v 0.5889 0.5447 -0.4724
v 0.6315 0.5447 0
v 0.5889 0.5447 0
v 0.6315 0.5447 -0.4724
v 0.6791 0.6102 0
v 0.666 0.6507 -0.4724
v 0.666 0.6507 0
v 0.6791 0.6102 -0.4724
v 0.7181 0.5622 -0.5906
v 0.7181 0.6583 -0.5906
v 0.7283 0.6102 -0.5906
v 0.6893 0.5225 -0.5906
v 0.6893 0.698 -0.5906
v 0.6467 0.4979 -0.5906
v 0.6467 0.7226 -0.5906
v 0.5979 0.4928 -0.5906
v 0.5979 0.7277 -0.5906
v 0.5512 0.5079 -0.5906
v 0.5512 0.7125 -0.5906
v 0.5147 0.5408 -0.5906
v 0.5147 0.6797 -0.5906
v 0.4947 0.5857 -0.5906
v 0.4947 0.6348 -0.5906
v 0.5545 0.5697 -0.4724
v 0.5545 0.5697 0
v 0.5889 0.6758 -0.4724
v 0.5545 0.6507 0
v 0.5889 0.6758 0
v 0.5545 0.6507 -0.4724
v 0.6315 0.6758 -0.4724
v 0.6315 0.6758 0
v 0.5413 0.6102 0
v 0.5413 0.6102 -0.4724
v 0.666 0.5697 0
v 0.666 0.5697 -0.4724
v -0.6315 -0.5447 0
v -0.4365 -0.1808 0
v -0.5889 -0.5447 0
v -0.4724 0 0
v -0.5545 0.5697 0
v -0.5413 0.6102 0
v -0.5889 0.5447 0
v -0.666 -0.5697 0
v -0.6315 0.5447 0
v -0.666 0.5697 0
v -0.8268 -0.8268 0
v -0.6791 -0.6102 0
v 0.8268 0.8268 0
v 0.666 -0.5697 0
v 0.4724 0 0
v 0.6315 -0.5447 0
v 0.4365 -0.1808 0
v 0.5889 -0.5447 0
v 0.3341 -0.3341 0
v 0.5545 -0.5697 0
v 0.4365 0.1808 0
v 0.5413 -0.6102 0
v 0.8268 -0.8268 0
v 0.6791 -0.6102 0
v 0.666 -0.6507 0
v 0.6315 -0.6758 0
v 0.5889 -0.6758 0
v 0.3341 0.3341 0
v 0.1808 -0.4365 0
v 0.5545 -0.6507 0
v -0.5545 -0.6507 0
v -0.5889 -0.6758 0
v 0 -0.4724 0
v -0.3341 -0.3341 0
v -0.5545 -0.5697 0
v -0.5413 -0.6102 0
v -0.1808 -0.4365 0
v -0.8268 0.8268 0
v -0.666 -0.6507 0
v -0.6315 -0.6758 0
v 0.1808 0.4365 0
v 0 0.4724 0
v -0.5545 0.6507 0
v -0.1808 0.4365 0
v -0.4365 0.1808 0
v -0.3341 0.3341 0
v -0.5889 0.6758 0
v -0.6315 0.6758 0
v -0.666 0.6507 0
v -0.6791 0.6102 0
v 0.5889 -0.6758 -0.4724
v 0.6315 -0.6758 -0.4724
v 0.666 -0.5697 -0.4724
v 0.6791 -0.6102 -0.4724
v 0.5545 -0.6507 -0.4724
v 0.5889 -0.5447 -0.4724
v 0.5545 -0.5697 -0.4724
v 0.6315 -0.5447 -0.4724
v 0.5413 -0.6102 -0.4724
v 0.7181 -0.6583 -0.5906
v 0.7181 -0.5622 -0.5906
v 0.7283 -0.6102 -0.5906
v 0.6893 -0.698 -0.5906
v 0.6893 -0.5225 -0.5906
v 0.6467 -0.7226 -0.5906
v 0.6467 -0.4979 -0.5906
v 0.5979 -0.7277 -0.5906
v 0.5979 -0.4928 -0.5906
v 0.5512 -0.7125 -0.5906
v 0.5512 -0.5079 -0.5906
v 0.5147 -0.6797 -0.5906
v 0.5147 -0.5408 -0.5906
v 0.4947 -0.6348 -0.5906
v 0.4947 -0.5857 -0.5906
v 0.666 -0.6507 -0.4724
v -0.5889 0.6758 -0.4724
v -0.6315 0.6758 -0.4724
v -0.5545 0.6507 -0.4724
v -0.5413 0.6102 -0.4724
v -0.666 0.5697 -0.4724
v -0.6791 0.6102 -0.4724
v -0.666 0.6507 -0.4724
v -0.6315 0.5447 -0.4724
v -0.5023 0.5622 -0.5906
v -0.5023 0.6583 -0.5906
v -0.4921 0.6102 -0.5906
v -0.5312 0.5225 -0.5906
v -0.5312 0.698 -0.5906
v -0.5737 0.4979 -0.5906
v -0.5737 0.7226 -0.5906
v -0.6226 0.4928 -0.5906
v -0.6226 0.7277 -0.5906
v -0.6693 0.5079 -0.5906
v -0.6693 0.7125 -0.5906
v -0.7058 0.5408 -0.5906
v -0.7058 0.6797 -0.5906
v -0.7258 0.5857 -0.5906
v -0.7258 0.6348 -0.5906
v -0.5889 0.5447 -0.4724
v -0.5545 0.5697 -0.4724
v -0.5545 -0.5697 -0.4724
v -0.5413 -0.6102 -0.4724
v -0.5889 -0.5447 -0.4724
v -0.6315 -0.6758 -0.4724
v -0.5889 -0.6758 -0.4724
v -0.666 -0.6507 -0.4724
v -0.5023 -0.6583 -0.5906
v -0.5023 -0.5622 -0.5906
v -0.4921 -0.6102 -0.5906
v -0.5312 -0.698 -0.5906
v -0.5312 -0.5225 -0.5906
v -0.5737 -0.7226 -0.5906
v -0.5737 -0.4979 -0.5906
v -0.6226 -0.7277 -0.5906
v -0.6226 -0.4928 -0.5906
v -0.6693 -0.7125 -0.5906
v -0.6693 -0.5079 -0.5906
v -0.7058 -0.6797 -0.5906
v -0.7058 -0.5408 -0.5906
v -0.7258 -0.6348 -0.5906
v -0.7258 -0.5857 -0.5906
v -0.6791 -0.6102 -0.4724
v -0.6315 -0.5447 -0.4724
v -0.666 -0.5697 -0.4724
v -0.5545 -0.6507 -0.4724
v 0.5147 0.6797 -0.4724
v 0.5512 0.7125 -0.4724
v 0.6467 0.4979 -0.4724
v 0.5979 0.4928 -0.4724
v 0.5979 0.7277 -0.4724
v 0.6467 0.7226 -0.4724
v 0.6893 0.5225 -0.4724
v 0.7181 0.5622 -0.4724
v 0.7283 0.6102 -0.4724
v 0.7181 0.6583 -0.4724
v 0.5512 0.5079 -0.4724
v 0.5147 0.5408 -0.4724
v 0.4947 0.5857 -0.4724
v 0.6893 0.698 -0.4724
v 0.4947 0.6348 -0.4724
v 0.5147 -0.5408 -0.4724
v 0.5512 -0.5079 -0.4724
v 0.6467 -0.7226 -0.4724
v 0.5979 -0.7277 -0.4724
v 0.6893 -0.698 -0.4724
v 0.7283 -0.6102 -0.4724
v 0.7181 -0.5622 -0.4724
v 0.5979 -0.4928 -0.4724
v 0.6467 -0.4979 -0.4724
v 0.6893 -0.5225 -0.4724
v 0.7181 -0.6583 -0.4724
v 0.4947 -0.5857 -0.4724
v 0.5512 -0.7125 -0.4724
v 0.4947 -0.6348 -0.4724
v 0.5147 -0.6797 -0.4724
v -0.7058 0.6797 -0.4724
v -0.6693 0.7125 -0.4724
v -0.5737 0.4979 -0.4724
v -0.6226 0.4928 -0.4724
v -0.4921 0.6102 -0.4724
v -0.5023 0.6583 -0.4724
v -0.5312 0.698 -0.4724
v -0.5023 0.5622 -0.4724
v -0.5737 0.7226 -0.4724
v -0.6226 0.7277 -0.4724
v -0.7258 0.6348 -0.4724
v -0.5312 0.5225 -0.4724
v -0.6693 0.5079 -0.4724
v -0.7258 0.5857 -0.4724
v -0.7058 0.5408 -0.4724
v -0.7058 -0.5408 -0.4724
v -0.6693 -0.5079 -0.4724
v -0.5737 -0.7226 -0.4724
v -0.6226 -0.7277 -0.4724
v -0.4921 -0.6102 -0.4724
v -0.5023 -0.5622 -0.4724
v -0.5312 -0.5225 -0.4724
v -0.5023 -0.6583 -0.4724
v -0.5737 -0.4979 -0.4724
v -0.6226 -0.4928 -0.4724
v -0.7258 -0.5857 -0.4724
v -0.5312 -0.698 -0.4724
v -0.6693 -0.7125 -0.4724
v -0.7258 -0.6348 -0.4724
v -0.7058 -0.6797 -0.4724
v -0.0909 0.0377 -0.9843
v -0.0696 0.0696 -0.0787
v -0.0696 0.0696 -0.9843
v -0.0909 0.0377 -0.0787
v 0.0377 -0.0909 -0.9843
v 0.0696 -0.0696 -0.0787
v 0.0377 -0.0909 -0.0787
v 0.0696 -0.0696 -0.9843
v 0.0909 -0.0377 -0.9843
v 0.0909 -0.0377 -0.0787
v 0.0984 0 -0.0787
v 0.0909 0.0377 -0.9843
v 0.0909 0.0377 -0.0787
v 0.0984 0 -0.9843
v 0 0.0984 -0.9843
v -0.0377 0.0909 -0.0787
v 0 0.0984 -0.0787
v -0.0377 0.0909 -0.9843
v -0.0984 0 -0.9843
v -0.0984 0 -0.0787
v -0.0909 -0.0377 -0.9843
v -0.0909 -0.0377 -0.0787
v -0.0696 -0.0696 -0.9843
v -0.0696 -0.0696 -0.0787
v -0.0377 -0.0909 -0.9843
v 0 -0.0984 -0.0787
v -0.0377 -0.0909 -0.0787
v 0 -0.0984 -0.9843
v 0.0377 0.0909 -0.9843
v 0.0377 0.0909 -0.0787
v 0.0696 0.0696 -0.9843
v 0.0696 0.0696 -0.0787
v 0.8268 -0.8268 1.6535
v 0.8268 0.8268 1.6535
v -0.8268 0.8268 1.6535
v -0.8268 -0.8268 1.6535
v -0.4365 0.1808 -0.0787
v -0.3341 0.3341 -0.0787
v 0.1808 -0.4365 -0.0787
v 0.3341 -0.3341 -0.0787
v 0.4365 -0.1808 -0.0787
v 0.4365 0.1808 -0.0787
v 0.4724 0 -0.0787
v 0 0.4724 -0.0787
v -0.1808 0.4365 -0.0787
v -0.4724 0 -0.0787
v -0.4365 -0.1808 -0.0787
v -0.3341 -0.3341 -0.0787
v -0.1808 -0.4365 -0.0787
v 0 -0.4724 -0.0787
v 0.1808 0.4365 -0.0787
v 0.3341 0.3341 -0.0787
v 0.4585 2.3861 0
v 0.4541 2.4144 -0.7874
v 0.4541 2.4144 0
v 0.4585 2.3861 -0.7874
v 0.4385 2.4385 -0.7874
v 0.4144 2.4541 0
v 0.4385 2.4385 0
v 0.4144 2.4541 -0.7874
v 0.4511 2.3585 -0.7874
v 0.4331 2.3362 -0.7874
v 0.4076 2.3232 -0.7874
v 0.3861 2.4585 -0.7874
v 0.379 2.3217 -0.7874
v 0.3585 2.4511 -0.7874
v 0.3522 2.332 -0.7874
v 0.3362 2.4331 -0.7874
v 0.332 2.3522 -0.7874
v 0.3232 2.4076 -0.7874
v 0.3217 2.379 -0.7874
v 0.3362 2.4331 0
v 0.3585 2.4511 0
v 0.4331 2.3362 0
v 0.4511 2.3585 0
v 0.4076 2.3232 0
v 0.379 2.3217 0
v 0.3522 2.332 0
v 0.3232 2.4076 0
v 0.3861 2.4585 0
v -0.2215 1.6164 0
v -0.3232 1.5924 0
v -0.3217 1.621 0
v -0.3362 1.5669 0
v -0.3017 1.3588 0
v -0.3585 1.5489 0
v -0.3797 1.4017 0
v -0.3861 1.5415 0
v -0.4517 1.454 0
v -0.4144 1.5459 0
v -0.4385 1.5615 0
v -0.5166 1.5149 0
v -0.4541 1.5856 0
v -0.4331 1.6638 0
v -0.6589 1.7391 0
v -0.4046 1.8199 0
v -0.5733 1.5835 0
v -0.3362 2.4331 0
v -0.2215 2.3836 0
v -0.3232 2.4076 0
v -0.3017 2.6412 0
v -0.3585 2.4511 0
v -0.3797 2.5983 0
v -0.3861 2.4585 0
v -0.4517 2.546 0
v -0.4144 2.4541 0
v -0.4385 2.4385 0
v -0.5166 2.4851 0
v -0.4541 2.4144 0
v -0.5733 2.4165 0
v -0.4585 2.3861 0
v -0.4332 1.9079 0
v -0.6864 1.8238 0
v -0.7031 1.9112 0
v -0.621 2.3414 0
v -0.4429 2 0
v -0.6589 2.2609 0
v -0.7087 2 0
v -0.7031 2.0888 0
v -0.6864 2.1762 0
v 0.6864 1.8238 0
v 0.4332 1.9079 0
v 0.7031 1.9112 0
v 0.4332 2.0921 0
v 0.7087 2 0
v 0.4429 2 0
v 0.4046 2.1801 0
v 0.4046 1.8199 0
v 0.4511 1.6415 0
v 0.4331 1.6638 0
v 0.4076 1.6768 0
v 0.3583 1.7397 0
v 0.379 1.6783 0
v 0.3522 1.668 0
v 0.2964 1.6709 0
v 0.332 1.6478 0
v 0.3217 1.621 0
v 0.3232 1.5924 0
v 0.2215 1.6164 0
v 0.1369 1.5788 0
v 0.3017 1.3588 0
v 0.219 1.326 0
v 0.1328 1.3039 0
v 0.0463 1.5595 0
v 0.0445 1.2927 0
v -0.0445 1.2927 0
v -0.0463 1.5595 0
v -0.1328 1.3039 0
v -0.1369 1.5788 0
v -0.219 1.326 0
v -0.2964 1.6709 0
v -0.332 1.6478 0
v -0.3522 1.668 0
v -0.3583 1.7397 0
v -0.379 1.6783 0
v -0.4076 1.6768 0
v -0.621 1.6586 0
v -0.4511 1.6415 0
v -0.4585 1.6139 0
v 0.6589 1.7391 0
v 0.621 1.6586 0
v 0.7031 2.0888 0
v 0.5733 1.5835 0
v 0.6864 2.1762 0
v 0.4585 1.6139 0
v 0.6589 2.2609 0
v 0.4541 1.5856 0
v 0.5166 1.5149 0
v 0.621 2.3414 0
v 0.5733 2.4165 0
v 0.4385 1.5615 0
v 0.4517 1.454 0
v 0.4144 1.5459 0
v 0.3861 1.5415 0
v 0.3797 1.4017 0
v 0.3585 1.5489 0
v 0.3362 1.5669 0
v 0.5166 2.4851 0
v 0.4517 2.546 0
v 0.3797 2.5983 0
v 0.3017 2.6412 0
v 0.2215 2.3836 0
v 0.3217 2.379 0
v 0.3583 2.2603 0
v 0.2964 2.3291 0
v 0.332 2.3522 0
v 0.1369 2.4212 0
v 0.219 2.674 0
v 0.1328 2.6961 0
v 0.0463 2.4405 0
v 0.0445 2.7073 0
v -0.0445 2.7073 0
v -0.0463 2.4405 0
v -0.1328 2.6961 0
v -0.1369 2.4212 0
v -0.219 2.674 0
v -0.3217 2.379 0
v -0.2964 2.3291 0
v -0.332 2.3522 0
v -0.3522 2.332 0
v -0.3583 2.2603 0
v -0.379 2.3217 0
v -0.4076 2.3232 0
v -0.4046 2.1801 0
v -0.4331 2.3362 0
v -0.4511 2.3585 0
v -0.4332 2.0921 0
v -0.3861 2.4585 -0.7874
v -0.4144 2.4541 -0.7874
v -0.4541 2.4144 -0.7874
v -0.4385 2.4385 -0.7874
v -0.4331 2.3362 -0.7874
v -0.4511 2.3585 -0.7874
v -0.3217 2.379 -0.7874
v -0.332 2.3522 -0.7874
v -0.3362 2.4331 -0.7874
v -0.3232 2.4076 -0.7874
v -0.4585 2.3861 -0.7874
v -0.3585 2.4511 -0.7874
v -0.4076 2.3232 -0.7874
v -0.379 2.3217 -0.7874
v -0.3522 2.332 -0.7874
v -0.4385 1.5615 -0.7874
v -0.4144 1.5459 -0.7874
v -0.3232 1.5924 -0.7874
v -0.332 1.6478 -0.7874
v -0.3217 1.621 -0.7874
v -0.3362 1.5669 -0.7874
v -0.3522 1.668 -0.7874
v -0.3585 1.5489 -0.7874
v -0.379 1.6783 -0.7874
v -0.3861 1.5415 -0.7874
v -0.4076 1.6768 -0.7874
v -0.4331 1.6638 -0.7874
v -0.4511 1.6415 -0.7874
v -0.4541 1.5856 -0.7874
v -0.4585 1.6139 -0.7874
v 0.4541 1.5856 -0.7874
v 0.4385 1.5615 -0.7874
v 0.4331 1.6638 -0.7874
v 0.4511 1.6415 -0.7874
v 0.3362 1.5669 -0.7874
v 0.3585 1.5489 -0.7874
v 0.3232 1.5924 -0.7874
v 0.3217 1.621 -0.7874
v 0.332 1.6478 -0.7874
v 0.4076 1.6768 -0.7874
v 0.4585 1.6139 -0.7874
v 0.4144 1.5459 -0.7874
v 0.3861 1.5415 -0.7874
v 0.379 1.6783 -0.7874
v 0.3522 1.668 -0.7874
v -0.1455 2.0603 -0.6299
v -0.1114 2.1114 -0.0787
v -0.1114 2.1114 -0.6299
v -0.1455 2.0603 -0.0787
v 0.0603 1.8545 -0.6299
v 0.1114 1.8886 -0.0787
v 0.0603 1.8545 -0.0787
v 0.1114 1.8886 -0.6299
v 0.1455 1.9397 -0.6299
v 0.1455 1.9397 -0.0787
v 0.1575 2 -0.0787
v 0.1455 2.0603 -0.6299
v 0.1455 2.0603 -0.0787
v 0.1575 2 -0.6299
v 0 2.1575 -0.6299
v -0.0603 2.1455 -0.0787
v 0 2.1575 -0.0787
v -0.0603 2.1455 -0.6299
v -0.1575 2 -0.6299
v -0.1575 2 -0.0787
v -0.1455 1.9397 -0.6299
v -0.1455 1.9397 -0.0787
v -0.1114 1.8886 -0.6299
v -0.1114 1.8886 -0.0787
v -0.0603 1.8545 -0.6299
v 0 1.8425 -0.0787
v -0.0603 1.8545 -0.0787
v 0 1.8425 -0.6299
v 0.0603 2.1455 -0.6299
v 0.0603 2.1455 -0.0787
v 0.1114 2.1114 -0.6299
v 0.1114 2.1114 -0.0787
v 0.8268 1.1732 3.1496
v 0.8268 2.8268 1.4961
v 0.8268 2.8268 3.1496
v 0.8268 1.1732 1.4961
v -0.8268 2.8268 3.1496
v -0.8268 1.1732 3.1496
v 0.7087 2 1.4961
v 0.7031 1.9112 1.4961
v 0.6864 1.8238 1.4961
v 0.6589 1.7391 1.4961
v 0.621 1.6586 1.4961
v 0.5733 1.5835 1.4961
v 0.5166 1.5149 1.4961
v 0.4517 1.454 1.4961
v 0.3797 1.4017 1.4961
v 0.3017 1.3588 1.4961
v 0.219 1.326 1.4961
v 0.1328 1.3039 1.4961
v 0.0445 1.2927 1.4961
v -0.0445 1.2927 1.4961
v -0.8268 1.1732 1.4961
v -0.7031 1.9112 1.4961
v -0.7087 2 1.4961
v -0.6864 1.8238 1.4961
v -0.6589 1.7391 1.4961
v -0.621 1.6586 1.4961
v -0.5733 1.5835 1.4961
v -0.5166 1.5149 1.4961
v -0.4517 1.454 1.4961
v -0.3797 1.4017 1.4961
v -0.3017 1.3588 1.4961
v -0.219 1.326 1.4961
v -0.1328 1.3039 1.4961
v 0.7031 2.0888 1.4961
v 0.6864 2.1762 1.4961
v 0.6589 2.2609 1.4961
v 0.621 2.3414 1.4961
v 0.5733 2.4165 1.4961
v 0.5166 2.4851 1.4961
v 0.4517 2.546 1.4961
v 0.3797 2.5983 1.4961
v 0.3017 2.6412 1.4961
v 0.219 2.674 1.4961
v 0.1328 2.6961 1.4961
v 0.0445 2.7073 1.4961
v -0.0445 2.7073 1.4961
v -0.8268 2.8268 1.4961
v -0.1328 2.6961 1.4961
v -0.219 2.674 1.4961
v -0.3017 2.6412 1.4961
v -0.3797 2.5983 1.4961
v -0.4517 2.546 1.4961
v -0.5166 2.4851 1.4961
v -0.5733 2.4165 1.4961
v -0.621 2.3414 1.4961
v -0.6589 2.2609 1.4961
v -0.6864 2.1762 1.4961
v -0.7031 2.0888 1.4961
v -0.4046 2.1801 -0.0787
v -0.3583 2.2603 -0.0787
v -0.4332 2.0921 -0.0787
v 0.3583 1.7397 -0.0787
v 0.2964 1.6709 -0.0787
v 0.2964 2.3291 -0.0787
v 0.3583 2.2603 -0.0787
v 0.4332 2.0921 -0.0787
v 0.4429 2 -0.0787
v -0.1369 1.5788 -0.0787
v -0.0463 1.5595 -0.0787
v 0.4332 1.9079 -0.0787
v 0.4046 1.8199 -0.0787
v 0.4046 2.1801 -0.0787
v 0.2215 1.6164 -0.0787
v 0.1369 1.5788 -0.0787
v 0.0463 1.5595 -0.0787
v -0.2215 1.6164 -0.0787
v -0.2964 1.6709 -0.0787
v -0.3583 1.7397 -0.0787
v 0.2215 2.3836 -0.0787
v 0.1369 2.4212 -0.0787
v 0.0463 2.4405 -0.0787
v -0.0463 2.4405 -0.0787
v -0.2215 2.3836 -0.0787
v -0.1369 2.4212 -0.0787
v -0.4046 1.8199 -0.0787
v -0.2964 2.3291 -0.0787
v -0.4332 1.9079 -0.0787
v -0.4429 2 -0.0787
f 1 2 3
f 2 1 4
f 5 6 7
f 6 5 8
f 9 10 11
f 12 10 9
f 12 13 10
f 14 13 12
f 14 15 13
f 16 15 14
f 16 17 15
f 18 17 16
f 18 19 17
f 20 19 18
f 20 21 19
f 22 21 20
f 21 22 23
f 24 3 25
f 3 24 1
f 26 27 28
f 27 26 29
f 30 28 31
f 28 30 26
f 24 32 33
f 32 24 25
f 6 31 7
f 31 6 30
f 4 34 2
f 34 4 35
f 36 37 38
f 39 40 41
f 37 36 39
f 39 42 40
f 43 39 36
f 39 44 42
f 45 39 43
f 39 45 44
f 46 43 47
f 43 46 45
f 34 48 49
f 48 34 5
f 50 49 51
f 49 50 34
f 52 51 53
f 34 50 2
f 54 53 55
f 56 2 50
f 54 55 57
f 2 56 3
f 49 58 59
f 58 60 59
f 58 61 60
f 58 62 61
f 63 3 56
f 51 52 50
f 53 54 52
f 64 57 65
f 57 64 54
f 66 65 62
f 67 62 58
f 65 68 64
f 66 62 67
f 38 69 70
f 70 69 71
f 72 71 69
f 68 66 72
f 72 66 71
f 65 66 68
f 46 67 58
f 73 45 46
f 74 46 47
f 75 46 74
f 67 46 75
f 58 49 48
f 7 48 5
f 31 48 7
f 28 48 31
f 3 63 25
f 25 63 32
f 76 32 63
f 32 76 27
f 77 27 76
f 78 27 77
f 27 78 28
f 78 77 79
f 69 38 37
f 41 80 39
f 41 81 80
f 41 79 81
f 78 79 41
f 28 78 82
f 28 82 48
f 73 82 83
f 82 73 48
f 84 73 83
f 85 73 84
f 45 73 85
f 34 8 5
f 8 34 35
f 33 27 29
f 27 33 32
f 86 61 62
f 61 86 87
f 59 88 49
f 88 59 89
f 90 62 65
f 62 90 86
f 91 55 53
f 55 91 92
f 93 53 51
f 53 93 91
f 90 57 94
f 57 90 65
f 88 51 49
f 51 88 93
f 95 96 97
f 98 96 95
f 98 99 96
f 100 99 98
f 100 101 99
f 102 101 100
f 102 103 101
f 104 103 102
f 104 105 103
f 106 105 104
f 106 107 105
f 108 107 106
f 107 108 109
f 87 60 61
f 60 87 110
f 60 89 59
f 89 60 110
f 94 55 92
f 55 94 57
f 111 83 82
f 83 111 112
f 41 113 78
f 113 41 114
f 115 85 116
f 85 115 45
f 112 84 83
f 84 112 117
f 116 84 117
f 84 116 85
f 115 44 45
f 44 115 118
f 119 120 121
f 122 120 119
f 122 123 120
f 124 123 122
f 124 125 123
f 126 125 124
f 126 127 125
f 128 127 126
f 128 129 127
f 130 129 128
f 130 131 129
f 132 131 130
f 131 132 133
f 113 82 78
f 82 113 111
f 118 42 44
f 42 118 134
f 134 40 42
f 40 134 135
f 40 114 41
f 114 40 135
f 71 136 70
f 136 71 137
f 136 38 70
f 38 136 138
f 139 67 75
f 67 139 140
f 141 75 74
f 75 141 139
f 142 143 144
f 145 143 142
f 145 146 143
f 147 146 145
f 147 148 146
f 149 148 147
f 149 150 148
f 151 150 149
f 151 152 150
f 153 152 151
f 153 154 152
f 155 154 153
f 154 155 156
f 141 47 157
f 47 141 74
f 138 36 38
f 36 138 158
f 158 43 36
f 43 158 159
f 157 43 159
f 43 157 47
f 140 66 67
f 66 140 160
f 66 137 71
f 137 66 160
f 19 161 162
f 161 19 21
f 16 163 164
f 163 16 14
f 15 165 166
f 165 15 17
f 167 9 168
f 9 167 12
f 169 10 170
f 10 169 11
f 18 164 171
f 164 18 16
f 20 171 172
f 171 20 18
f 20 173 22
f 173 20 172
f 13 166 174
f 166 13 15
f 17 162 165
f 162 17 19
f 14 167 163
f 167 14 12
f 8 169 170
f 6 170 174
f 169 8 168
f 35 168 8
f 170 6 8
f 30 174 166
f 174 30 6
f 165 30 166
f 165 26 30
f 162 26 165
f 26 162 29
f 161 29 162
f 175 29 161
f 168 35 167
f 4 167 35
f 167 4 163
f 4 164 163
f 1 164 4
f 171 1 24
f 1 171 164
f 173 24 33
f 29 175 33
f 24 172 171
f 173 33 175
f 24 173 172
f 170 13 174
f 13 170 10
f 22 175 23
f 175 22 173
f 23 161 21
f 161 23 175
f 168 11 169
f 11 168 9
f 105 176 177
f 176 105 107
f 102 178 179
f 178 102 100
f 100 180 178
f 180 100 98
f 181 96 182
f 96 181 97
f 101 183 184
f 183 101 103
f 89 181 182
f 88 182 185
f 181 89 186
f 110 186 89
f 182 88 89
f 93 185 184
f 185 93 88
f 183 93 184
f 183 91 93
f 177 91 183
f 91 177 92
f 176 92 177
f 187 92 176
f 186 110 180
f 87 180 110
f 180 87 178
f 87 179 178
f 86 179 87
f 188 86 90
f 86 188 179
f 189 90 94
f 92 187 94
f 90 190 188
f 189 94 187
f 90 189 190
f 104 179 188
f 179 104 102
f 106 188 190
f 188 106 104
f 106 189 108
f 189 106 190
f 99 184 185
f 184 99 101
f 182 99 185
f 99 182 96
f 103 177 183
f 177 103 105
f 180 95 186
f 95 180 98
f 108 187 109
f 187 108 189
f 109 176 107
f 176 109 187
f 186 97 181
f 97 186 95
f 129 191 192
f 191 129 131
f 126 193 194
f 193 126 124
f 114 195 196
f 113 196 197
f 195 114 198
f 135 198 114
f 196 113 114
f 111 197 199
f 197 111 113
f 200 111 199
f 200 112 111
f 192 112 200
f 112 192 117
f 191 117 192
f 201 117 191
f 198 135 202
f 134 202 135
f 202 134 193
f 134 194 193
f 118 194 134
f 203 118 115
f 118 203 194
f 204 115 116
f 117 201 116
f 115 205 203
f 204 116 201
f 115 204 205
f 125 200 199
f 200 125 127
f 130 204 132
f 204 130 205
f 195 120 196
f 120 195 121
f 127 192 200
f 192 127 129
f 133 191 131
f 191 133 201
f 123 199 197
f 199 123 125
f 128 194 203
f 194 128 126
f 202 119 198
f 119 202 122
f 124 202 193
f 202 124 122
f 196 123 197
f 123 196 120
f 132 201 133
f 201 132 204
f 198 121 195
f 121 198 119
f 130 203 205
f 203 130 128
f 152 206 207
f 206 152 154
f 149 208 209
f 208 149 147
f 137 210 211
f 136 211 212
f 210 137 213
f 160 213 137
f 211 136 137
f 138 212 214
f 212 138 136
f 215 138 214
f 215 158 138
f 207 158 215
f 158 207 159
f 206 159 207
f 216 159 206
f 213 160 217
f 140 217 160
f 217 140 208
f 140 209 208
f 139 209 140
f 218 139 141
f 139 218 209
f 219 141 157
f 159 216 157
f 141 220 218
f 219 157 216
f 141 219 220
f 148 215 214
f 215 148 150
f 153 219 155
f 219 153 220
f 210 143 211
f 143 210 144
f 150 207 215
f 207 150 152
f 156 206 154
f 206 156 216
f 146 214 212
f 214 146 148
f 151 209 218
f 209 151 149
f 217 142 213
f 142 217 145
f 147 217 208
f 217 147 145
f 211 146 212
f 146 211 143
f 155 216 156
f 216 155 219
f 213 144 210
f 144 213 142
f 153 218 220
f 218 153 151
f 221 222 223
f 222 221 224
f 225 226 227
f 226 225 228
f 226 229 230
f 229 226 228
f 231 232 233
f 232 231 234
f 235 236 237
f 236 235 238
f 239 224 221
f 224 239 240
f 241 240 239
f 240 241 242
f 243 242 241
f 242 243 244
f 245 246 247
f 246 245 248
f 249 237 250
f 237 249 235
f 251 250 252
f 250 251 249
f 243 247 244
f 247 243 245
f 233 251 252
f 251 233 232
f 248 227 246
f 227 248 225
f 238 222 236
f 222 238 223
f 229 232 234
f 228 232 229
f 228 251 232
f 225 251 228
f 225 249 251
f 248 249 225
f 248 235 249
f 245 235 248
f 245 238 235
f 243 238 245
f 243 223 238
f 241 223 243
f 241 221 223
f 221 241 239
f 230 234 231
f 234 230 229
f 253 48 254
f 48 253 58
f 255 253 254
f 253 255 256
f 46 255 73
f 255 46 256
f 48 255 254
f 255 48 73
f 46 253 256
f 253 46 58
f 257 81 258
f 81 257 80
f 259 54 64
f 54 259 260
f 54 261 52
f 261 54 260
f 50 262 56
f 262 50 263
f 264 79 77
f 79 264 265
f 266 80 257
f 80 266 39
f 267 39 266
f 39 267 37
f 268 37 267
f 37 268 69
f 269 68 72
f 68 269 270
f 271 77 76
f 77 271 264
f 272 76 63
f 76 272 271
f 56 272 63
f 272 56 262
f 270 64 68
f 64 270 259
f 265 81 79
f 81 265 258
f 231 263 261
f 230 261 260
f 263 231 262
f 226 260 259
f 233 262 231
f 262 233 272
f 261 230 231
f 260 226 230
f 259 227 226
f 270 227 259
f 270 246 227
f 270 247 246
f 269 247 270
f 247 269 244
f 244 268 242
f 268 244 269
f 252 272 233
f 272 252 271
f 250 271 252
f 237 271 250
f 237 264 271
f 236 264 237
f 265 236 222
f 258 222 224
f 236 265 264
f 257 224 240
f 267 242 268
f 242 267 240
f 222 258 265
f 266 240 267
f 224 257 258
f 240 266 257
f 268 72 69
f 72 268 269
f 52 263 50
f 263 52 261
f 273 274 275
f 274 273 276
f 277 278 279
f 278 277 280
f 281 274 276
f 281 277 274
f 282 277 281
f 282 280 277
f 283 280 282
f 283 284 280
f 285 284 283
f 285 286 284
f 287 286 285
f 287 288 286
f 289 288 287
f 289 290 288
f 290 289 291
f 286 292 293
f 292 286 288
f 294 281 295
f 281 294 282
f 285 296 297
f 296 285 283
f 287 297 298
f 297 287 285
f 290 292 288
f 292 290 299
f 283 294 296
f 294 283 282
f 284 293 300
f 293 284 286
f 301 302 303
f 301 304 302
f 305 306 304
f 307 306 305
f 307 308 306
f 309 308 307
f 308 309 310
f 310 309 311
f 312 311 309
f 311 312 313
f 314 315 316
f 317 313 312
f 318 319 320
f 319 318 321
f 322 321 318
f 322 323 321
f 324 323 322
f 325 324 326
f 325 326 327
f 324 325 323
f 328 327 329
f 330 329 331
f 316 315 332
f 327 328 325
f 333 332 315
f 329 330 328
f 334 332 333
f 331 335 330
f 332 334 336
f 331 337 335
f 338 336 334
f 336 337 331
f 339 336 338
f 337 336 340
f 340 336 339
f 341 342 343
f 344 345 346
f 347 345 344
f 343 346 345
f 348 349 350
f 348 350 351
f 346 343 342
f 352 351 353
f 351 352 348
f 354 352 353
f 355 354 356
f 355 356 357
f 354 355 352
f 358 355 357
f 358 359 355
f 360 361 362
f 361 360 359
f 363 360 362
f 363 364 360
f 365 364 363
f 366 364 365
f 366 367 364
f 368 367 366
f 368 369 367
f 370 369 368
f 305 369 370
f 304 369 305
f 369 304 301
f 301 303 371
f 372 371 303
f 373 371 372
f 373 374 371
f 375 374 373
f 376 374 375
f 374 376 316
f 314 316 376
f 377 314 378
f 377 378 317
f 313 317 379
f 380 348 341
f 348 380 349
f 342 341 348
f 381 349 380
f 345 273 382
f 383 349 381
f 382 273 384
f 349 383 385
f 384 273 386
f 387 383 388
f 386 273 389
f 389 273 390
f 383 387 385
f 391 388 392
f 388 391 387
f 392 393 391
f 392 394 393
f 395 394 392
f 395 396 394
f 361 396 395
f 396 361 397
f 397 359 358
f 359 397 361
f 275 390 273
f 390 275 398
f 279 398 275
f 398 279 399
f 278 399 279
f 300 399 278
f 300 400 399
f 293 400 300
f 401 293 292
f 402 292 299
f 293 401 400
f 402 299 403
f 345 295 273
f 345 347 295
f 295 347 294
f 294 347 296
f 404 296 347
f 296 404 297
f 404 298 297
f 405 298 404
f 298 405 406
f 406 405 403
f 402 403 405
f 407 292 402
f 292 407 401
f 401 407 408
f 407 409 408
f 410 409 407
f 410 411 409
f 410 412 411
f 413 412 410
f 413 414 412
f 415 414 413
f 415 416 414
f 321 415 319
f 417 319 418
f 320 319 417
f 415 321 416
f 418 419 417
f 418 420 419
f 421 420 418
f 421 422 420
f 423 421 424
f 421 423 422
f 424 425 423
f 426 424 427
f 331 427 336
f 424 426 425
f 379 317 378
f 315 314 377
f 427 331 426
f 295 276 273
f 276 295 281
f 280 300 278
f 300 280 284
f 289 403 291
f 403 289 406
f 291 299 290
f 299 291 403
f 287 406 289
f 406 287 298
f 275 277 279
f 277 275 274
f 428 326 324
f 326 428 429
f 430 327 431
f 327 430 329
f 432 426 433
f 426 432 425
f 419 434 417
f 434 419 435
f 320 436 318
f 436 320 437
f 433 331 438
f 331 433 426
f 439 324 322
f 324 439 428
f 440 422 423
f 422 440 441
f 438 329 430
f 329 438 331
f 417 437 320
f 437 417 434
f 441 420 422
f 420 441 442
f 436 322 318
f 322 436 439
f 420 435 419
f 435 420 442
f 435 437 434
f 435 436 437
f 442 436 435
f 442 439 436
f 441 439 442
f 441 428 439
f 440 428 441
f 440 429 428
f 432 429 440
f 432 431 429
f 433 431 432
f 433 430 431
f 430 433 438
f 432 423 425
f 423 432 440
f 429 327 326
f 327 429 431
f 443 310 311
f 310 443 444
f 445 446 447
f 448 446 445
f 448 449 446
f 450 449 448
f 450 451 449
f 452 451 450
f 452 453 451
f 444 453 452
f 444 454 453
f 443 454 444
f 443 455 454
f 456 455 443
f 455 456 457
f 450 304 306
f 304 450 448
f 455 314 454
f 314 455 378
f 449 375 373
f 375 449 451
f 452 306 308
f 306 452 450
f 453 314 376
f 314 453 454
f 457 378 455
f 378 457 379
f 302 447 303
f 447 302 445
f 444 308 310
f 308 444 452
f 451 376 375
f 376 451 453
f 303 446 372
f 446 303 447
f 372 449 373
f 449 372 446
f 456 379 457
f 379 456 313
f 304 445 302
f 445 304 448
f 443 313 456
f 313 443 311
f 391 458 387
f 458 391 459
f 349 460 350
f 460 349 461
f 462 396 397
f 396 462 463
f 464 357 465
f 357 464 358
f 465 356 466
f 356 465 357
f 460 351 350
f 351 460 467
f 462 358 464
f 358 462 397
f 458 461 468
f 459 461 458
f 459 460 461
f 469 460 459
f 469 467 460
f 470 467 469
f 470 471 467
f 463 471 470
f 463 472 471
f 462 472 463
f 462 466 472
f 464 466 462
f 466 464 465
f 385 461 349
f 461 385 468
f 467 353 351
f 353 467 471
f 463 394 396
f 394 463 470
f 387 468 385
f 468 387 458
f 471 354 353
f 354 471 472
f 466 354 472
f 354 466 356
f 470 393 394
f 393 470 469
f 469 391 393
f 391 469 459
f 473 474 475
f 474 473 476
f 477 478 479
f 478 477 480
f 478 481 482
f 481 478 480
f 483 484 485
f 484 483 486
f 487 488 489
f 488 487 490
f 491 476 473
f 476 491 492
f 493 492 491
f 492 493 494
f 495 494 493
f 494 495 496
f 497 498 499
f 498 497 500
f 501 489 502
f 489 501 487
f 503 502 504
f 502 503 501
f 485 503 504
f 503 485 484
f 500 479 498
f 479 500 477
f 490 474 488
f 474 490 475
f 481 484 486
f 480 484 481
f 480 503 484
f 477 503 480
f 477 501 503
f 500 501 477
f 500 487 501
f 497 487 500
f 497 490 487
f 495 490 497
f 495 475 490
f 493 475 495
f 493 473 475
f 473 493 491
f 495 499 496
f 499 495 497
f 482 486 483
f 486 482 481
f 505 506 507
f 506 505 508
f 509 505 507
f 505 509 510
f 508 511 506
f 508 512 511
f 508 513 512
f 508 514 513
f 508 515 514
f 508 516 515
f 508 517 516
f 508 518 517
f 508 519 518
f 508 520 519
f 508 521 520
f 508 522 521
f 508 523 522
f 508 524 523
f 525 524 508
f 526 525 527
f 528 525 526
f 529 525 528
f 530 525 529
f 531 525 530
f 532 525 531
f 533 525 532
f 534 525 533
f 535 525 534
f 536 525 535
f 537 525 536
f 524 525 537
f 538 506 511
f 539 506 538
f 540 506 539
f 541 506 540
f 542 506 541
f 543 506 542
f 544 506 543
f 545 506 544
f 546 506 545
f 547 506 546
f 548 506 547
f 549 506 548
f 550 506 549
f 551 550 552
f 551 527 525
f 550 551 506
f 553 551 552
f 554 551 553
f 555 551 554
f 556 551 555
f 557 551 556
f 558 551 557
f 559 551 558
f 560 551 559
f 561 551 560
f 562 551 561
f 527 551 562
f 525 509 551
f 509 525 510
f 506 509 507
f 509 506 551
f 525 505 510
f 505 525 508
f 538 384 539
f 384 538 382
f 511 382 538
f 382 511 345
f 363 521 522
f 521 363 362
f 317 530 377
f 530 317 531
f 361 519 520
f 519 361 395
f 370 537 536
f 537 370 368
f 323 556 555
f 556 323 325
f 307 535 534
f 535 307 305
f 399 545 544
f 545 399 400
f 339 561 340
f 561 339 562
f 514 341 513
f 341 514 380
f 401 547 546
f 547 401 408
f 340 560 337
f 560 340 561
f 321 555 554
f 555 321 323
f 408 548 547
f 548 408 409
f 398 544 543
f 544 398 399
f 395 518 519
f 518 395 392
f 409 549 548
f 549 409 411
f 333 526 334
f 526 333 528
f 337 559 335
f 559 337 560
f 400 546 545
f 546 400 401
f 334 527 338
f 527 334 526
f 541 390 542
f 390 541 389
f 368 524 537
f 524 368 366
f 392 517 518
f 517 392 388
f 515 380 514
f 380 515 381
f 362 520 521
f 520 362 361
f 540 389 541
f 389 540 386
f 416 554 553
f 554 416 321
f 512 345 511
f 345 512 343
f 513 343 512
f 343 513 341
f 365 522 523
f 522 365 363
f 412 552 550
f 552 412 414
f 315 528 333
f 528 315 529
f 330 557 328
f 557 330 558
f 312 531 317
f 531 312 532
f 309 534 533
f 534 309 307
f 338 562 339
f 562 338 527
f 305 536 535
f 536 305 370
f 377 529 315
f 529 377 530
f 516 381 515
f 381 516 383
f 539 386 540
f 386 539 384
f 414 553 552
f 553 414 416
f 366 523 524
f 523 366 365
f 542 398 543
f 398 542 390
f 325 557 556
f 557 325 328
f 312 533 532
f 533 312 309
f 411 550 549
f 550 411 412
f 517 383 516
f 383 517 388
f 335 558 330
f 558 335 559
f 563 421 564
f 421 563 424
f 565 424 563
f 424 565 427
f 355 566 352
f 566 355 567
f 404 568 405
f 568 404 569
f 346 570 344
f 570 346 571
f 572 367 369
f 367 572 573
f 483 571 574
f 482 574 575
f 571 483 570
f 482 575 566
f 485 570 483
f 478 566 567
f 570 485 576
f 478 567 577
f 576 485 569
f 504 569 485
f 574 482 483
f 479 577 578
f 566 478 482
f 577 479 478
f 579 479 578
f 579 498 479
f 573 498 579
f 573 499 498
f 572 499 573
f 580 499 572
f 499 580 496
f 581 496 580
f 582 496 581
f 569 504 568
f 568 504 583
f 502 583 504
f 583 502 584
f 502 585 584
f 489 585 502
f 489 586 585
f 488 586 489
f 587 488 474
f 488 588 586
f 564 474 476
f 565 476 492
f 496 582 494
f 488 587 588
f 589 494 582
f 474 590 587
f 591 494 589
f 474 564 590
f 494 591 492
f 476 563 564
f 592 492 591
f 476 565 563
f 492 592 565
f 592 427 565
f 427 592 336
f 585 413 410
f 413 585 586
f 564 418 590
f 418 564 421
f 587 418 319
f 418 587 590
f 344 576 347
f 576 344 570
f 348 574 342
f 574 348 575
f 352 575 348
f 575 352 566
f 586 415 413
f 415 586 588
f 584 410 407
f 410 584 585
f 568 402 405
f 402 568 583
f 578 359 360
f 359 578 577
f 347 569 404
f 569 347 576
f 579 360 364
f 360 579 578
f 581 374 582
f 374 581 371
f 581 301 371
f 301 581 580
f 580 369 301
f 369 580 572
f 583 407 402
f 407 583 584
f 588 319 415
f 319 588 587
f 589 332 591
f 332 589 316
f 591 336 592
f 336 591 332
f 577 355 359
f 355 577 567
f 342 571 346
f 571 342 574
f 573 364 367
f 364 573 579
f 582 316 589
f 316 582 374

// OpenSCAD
module NEMA17(cutter=false) {
  color("DimGrey")
  render()
  scale(1/25.4) {
    
    // Output Shaft
    mirror([0,0,1])
    cylinder(r=5/2, h=25, $fn=16);
    
    // Motor Body
    translate([-21, -21,0])
    cube([42, 42, 42]);
    
    // Center boss
    mirror([0,0,1])
    cylinder(r=(24/2), h=2 + (cutter?25:0), $fn=16);
    
    // Mounting bolts
    for (X = [1,-1]) for (Y=[1,-1])
    translate([X*31/2, Y*31/2, 0])
    mirror([0,0,1])
    cylinder(r=3.5/2, h=15, $fn=10);
    
    // Mounting bolts
    for (X = [1,-1]) for (Y=[1,-1])
    translate([X*31/2, Y*31/2, -12])
    mirror([0,0,1])
    cylinder(r=6/2, h=3+(cutter?12:0), $fn=15);
  }
}

module PlanetaryNEMA17(cutter=true) {
  color("DimGrey")
  render()
  scale(1/25.4) {
    
    // Output Shaft
    mirror([0,0,1])
    cylinder(r=8/2, h=16, $fn=16);
    
    // Motor Body
    translate([-21, -21,38])
    cube([42, 42, 42]);
    
    // Gearbox
    cylinder(r=(36/2), h=38 + (cutter?25:0), $fn=50);
    
    // Center boss
    mirror([0,0,1])
    cylinder(r=(22.5/2), h=2, $fn=30);
    
    // Mounting bolts
    for (R = [0:90:360]) rotate(45+R)
    translate([28/2, 0, 0])
    mirror([0,0,1])
    cylinder(r=3.5/2, h=8+(cutter?12:0), $fn=15);
  }
}
NEMA17();

translate([0,2,0])
PlanetaryNEMA17();
